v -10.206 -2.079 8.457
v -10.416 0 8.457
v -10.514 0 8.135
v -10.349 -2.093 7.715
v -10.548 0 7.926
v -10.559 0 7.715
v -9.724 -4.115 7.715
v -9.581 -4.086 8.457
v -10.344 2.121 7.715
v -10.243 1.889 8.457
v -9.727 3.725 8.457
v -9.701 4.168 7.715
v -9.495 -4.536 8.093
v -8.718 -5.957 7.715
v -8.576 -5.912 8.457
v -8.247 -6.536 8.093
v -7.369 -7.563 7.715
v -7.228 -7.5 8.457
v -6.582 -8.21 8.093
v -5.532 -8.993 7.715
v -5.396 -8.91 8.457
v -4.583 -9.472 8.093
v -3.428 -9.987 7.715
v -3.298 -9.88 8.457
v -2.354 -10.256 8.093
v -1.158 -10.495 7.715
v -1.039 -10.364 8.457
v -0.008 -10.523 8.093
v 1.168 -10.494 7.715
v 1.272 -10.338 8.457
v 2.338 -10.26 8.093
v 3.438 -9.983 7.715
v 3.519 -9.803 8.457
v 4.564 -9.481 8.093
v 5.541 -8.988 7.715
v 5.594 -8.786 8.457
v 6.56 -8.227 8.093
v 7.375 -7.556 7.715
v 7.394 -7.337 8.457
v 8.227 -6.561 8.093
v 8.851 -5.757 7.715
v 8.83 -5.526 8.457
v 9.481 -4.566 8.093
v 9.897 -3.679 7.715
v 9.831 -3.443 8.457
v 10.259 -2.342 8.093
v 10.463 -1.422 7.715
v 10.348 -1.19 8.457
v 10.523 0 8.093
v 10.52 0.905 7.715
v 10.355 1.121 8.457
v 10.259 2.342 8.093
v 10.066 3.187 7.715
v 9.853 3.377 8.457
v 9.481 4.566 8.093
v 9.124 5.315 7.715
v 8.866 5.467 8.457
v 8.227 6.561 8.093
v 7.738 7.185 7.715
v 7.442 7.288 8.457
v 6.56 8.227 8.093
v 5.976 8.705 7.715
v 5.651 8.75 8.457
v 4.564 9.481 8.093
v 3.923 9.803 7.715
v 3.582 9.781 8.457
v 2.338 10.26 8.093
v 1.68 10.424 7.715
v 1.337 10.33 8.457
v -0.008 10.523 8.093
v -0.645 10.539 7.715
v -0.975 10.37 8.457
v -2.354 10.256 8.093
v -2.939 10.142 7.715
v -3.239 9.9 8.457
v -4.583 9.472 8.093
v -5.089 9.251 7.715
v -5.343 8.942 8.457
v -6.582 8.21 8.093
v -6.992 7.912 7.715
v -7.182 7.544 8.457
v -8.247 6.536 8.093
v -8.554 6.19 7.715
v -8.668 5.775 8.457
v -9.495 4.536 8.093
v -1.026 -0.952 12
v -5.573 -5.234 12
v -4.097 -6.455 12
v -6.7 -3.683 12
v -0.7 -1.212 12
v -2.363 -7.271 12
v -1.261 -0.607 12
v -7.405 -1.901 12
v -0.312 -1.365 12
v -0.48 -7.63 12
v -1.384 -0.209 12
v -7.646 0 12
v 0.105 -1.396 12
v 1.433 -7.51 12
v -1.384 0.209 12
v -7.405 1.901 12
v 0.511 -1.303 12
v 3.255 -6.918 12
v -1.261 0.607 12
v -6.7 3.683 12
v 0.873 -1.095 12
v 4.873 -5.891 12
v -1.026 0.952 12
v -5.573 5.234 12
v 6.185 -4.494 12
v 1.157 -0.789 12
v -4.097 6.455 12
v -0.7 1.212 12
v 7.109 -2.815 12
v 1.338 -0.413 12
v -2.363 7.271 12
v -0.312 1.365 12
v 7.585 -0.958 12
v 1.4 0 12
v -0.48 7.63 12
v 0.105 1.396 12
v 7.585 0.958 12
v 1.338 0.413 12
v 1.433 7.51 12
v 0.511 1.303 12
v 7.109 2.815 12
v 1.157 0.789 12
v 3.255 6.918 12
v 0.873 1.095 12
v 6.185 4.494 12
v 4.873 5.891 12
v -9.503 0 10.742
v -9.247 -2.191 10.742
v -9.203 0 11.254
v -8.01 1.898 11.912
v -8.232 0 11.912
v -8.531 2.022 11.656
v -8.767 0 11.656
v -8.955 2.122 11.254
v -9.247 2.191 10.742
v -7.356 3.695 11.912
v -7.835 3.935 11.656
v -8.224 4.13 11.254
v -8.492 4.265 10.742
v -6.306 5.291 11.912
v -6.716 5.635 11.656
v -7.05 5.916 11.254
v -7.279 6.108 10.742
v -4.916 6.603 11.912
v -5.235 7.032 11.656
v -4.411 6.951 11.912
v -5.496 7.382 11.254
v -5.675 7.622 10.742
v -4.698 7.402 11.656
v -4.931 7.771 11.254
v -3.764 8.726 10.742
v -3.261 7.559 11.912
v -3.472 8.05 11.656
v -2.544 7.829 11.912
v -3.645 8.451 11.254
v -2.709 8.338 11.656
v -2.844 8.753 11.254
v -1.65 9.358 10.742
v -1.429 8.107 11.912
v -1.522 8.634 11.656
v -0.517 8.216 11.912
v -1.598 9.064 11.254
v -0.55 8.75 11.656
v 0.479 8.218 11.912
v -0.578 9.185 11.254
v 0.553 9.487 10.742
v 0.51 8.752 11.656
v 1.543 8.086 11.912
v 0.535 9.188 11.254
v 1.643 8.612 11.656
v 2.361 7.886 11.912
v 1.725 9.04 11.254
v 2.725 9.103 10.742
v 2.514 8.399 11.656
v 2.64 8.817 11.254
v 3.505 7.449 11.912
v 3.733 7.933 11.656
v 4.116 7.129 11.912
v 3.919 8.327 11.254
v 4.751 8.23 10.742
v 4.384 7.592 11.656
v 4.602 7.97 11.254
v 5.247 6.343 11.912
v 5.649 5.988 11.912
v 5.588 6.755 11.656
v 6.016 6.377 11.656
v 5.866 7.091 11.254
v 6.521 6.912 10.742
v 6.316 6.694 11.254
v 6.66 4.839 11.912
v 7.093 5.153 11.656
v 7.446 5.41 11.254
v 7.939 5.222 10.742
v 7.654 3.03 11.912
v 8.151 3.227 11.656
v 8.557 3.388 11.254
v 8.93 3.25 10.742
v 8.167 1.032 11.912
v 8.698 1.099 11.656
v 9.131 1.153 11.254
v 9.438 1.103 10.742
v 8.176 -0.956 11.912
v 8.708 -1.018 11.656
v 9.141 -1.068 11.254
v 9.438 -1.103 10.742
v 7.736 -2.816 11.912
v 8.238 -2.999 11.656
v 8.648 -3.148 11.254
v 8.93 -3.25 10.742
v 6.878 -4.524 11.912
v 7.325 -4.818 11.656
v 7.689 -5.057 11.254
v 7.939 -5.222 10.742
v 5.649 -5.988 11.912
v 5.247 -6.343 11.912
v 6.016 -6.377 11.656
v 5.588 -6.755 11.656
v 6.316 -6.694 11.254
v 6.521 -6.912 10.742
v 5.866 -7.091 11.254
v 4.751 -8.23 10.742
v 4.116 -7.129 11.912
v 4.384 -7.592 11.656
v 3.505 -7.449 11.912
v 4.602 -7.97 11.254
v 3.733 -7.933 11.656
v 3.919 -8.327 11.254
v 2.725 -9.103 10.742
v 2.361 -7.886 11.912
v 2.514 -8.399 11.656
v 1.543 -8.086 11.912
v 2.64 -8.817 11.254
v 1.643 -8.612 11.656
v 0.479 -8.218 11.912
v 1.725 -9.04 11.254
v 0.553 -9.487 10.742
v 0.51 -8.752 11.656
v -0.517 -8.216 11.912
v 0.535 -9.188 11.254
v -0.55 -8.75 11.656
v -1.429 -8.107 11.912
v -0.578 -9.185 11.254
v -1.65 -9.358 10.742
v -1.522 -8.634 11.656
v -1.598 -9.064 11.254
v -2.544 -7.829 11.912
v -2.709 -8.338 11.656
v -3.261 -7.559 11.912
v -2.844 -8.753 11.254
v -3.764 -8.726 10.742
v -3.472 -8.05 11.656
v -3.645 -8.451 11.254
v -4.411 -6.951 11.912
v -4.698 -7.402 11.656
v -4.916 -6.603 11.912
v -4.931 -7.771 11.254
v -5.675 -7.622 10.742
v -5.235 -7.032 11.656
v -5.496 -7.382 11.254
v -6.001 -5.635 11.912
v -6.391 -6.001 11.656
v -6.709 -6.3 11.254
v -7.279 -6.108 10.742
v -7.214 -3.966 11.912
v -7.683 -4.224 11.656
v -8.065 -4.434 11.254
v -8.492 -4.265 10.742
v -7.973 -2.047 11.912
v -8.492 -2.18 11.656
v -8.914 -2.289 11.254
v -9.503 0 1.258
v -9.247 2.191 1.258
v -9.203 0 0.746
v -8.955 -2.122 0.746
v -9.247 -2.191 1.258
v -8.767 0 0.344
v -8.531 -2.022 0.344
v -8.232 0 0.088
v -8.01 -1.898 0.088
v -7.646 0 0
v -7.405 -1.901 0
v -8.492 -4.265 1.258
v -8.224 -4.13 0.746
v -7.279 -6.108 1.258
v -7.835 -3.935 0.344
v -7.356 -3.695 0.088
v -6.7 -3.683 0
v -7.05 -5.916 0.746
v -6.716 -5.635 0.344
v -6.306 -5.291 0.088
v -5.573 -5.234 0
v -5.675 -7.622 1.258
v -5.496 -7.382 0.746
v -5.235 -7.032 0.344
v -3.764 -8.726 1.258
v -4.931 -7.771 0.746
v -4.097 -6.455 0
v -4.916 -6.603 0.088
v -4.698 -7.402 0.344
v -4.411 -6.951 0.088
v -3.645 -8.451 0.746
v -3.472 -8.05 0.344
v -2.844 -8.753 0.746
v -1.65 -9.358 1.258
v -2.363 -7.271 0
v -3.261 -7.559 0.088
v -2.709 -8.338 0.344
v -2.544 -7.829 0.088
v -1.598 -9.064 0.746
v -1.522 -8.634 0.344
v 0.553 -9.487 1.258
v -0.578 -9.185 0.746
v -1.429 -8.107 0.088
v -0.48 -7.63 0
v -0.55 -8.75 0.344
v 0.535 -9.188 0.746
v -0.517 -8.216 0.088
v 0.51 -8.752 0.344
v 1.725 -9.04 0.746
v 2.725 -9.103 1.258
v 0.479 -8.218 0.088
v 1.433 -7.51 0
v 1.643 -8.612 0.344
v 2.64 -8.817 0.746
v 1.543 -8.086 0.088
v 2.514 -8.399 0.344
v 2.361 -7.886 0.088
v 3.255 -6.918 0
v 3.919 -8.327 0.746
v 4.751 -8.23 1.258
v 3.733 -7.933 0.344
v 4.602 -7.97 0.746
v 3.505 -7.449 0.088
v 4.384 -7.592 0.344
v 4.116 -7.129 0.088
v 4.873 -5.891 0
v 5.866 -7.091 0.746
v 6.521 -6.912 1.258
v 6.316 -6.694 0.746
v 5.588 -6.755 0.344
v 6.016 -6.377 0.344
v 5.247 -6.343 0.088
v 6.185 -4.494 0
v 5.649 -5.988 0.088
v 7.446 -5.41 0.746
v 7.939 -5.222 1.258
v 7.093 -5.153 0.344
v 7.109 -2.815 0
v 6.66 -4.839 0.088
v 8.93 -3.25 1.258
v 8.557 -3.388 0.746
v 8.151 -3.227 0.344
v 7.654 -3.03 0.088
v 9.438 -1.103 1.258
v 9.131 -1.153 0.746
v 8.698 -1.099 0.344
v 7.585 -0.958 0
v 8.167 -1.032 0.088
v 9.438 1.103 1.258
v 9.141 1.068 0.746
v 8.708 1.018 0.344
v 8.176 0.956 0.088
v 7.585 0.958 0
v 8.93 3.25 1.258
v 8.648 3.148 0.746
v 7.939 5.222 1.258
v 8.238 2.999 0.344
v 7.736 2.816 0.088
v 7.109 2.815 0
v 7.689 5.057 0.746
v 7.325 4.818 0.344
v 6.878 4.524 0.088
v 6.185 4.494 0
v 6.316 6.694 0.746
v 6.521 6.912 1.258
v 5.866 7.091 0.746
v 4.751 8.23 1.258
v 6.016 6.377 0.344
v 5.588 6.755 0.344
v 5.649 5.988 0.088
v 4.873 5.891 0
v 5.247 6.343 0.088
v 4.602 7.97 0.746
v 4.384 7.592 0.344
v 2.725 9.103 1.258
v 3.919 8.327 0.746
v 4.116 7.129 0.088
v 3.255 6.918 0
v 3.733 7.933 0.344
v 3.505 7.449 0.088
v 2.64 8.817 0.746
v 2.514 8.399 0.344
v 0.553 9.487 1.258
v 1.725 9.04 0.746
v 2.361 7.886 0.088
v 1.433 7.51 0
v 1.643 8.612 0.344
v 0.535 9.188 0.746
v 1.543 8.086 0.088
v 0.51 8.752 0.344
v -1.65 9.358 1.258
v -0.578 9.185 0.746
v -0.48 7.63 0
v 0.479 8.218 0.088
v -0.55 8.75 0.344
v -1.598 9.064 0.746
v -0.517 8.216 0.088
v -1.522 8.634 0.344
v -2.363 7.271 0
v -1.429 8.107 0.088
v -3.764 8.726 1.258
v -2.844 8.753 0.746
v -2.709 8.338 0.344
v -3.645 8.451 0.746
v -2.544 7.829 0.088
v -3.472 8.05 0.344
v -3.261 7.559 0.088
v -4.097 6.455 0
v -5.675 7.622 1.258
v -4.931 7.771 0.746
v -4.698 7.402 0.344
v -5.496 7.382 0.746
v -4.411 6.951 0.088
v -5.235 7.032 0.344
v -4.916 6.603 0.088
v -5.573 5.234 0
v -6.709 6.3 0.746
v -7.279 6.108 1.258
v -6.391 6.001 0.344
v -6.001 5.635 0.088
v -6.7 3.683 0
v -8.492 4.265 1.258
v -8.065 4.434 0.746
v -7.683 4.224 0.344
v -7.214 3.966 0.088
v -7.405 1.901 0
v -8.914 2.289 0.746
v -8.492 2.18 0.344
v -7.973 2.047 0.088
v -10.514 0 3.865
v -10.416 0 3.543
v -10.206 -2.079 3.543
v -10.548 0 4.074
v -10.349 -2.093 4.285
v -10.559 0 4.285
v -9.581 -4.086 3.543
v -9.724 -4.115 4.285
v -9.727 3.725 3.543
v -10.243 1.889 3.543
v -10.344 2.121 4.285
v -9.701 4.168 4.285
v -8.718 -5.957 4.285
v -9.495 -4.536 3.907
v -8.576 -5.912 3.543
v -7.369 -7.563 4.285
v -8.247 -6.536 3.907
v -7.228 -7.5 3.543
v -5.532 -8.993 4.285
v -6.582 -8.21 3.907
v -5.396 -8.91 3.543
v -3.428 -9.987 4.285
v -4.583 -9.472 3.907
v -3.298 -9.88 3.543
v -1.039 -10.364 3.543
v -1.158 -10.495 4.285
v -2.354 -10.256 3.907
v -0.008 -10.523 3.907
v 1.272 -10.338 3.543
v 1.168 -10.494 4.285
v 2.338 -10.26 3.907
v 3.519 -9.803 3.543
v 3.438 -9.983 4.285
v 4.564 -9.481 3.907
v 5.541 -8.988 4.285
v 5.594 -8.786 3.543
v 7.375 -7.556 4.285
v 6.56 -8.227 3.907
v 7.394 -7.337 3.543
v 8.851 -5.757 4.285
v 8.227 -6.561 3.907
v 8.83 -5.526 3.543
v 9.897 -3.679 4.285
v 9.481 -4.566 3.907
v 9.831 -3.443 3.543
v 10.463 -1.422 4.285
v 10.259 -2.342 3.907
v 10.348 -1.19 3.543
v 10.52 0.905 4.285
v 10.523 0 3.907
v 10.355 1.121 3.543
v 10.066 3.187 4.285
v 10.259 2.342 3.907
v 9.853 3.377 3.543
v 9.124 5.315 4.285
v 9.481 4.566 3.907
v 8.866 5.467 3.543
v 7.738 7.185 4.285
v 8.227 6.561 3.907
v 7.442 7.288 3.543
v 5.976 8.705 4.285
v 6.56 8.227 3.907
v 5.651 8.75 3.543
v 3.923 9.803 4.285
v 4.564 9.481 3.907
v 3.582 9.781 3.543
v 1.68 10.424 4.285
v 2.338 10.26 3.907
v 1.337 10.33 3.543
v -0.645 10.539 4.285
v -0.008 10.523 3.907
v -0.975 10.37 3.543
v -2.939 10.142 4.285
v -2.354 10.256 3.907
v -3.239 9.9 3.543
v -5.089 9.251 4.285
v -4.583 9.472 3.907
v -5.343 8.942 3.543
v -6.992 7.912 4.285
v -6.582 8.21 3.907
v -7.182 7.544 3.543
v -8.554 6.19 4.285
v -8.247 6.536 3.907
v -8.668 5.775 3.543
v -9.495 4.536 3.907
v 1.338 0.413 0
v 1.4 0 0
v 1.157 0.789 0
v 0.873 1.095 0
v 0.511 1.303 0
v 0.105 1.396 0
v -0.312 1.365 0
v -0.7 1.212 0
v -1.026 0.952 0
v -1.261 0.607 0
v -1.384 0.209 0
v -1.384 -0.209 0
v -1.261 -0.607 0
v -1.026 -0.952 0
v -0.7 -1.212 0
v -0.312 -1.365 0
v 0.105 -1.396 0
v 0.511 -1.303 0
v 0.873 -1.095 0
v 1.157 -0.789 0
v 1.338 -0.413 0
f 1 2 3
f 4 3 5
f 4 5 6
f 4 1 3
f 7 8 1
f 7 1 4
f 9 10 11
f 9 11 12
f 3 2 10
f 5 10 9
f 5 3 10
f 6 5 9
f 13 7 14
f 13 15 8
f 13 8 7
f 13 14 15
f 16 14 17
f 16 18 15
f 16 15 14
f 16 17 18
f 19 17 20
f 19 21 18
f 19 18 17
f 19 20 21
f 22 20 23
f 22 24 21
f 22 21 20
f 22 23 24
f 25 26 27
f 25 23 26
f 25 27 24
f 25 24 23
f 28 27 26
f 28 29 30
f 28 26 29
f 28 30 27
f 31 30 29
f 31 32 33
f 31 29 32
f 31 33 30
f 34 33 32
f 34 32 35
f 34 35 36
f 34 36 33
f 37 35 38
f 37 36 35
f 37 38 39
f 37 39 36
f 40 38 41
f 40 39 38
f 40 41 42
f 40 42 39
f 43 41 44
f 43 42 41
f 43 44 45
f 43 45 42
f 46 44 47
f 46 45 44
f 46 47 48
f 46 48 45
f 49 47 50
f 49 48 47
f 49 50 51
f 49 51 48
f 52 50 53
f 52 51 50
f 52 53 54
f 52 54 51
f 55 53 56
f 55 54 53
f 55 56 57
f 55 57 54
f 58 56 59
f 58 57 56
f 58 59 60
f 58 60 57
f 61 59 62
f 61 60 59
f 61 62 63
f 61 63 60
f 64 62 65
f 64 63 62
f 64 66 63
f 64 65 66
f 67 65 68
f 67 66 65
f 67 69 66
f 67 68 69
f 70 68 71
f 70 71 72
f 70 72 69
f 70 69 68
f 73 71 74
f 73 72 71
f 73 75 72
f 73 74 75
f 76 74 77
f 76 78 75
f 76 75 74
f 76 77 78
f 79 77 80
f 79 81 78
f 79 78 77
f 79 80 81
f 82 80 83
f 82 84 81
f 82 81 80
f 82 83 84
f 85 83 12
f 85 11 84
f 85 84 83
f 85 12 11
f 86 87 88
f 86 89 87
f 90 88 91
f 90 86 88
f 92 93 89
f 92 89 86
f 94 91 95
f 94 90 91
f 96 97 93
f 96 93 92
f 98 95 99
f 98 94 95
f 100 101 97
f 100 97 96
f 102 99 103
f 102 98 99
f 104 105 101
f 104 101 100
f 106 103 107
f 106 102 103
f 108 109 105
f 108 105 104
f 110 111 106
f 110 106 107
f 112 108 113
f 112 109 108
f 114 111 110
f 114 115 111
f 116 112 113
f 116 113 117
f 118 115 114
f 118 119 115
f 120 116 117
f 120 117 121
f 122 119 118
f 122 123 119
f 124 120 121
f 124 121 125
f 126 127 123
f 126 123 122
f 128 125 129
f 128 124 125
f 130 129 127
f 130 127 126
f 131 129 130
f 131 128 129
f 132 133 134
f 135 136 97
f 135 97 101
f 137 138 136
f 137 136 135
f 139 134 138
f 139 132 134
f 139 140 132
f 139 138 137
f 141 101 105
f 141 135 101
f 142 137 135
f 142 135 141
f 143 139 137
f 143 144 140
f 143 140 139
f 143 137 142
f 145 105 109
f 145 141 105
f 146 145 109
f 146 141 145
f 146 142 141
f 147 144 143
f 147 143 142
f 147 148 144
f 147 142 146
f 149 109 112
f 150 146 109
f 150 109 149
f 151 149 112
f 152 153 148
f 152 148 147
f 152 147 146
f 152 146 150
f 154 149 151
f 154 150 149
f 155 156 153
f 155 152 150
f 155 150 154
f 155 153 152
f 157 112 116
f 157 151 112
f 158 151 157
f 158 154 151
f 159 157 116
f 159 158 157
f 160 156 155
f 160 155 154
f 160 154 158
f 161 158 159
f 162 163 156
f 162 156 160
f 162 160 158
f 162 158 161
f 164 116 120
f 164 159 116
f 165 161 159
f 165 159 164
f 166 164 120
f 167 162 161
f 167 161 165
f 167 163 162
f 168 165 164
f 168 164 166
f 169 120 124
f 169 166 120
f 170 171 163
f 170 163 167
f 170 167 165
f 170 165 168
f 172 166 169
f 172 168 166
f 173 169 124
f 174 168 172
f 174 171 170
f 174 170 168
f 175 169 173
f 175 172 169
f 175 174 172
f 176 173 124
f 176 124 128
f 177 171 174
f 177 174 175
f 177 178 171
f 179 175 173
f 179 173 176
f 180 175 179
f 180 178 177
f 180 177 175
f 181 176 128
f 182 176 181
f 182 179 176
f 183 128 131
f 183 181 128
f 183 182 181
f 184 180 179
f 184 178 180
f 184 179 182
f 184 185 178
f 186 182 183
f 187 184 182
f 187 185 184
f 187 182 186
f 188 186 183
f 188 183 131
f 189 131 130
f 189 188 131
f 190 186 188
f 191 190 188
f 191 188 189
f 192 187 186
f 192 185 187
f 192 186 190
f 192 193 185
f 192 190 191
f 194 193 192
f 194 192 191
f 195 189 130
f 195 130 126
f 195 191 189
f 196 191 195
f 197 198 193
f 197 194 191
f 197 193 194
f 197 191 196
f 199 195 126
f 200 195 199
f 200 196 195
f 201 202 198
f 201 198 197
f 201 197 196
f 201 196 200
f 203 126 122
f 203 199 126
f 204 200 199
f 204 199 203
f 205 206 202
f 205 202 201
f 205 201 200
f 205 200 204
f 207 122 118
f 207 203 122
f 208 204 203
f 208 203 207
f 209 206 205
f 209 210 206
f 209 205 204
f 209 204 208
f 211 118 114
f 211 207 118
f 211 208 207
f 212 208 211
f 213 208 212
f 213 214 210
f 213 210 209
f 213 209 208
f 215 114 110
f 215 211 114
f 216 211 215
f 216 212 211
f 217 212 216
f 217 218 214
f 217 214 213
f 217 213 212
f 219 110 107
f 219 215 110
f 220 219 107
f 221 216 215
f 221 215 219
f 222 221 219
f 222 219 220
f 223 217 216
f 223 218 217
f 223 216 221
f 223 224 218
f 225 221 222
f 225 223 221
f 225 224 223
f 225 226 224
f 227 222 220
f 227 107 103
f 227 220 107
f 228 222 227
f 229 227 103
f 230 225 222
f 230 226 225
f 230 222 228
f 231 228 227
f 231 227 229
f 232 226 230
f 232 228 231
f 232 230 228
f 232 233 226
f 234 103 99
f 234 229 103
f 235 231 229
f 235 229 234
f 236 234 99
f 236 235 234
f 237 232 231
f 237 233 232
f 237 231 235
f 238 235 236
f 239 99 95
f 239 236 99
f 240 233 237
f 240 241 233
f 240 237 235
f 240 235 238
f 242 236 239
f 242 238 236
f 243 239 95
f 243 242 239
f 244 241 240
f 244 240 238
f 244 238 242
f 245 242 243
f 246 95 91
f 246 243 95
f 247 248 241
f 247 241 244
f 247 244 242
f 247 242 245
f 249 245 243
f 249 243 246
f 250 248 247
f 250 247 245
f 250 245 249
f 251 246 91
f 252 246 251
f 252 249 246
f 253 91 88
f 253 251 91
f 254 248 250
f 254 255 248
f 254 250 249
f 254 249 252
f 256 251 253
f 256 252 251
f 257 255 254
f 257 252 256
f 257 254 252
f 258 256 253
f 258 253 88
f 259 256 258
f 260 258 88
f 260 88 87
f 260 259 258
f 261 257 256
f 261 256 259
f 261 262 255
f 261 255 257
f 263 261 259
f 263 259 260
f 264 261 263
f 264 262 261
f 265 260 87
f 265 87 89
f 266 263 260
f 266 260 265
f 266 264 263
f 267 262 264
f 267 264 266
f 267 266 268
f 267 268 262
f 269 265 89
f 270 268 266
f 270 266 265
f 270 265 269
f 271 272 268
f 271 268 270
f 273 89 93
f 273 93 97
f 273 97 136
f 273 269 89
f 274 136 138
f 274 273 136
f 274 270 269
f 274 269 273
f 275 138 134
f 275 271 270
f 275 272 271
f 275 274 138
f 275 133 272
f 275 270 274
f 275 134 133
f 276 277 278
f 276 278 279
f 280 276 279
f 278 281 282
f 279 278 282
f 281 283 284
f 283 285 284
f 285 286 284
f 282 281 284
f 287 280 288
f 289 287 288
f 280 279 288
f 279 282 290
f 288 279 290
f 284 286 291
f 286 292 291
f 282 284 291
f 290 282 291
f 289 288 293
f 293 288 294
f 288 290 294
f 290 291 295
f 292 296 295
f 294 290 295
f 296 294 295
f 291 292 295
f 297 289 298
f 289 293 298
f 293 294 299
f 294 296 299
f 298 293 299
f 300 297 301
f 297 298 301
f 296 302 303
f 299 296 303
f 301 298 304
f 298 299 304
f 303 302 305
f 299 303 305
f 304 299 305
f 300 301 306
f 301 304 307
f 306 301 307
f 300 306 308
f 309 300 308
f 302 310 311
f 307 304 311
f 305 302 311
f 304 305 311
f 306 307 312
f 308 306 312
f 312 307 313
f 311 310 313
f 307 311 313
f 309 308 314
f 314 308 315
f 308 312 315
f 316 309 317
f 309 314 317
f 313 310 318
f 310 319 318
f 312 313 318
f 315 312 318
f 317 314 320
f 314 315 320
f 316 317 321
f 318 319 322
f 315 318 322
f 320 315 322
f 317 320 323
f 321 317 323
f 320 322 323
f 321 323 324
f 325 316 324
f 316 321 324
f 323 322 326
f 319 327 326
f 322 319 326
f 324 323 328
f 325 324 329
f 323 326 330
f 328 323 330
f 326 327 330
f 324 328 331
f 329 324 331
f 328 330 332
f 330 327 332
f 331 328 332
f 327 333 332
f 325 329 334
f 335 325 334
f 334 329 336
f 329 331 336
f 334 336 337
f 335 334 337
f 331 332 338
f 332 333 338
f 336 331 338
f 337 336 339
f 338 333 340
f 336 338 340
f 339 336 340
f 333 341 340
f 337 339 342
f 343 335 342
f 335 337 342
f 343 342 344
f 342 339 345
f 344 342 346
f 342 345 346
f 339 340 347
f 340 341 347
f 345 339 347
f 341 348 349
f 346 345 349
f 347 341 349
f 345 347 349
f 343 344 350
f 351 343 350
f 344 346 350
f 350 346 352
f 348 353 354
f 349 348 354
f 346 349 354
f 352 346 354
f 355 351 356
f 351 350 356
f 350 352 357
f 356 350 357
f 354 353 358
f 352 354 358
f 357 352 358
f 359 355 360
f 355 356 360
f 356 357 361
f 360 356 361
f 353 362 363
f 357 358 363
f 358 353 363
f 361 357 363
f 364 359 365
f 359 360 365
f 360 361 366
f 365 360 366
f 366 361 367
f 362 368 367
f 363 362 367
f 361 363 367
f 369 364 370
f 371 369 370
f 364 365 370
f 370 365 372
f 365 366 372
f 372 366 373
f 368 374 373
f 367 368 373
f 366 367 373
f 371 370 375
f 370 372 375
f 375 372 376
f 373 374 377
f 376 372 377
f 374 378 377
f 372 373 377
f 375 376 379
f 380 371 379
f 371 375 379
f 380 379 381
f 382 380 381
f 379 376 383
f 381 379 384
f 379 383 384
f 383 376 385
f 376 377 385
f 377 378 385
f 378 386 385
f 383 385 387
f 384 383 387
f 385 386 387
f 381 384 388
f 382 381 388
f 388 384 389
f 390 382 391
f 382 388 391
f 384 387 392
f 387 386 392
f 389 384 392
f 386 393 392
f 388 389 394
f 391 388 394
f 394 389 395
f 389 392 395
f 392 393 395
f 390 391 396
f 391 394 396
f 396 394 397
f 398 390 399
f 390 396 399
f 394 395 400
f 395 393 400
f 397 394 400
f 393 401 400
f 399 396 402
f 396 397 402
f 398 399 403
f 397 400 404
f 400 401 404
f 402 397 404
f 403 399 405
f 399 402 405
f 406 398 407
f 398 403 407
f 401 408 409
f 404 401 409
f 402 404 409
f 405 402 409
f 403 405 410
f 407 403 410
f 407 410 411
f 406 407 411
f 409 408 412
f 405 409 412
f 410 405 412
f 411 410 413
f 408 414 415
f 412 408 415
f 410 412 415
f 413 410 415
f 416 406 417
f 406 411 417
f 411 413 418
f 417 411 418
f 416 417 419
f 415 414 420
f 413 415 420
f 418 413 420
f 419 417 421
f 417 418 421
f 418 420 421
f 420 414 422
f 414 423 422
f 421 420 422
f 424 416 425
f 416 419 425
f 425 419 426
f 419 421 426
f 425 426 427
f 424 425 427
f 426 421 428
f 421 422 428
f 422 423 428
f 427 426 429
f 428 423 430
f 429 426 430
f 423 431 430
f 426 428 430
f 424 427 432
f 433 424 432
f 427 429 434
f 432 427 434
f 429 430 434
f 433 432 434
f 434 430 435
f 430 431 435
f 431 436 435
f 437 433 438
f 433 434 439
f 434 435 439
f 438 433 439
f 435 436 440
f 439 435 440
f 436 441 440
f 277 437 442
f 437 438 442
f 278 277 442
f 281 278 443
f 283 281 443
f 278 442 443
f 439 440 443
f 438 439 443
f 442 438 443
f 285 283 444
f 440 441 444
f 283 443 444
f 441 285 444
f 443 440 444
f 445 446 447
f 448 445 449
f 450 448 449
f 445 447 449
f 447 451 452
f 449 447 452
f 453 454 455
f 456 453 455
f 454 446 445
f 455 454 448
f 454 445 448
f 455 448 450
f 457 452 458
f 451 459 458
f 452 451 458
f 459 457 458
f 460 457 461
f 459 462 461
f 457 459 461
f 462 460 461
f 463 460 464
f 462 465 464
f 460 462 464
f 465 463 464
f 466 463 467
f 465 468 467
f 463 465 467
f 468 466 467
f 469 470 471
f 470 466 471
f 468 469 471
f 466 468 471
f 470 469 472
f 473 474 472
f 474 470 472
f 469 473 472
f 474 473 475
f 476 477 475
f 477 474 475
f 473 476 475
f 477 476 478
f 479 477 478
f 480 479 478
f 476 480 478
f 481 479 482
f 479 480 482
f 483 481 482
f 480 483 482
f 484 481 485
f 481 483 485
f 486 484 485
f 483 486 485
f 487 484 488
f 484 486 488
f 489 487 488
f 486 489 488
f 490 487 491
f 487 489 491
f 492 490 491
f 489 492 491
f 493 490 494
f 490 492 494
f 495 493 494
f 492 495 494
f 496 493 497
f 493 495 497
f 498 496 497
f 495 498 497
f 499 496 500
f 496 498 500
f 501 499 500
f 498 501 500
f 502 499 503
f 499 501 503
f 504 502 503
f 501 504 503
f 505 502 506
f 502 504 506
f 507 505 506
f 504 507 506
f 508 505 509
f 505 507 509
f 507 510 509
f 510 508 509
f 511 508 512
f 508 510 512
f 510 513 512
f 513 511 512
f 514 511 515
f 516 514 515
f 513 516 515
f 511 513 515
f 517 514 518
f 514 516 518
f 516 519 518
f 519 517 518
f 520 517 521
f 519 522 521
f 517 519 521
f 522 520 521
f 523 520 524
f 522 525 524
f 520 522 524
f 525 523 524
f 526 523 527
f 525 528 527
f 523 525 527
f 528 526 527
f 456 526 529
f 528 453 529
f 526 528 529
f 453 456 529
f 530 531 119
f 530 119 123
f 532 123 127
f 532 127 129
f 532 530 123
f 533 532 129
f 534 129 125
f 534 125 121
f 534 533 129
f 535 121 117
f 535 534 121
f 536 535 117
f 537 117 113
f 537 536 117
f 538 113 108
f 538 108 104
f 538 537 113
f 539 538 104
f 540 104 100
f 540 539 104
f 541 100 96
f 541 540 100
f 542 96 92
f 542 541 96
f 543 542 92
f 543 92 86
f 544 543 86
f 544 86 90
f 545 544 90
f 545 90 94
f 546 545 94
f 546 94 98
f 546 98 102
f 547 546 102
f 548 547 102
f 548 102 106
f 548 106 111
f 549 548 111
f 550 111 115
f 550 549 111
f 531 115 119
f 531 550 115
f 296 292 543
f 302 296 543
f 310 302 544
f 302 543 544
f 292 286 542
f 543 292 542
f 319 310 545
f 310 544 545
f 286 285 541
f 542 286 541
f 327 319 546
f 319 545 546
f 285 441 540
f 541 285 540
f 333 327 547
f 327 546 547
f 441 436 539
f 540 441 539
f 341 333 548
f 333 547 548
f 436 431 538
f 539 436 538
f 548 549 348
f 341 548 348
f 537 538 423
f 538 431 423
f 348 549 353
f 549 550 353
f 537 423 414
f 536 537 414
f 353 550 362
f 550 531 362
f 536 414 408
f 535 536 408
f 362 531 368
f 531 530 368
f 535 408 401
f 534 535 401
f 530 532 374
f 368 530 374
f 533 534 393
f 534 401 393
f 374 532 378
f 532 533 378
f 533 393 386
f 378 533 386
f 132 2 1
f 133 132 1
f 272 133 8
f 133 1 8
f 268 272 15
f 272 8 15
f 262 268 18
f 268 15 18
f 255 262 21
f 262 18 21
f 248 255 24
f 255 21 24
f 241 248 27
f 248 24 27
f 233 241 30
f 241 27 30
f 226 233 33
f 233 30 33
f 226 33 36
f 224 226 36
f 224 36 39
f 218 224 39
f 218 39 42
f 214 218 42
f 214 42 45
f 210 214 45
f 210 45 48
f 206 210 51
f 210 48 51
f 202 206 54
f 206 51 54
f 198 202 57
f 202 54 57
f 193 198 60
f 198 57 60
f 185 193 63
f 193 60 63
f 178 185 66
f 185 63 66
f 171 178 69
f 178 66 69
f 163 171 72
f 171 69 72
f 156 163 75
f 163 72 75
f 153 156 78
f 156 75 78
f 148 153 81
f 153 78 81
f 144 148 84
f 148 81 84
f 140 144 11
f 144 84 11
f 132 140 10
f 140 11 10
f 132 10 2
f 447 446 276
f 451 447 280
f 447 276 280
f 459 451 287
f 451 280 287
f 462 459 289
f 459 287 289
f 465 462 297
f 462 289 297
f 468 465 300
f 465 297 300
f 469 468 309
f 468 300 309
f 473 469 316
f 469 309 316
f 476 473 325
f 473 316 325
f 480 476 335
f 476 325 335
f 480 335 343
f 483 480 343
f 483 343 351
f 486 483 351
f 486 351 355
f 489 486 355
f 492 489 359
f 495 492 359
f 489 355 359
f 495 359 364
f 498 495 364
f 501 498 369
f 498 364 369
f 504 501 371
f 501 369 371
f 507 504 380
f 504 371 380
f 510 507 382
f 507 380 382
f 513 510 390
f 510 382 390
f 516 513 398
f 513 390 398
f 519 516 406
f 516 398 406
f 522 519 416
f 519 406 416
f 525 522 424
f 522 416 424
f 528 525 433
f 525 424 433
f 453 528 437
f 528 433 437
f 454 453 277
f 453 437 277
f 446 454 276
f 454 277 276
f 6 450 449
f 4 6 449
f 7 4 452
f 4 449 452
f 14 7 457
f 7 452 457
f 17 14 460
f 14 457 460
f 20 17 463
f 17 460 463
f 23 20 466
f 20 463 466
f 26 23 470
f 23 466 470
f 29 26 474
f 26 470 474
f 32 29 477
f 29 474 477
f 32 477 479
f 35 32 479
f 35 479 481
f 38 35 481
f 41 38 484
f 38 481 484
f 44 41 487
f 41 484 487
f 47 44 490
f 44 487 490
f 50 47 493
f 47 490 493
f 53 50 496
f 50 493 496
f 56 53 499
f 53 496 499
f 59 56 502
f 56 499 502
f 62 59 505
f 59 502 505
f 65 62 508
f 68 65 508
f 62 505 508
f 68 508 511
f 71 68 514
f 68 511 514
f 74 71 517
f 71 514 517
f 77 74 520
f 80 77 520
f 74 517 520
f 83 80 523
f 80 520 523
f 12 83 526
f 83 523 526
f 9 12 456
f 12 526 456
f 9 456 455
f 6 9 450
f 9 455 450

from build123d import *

# Parameters (mm, degrees)
F0_R     = 9
F0_R_2   = 1.4
F1_DEPTH = 12
F4_R     = 2


with BuildPart() as f1:
    # F0 (on Top) → F1 (new body)
    with BuildSketch(Plane.XY):
        Circle(F0_R)
        Circle(F0_R_2, mode=Mode.SUBTRACT)
    extrude(amount=F1_DEPTH)

    # F2 (on Front) → F3 (revolve)
    with BuildSketch(Plane.XZ):
        Polygon((-10.558846, 3.9), (-9, 0), (-9, 12), (-10.558846, 8.1), align=None)
    revolve(axis=Axis((0, 0, 12), (0, 0, 1)))

    # F4
    f4_edges = [f1.edges().sort_by_distance(p)[0] for p in [
        (10.558846, 0, 3.9),
        (10.558846, 0, 8.1),
        (-9.779423, 0, 1.95),
        (9, 0, 0),
        (9, 0, 12),
    ]]
    fillet(f4_edges, radius=F4_R)


solid = f1.part
